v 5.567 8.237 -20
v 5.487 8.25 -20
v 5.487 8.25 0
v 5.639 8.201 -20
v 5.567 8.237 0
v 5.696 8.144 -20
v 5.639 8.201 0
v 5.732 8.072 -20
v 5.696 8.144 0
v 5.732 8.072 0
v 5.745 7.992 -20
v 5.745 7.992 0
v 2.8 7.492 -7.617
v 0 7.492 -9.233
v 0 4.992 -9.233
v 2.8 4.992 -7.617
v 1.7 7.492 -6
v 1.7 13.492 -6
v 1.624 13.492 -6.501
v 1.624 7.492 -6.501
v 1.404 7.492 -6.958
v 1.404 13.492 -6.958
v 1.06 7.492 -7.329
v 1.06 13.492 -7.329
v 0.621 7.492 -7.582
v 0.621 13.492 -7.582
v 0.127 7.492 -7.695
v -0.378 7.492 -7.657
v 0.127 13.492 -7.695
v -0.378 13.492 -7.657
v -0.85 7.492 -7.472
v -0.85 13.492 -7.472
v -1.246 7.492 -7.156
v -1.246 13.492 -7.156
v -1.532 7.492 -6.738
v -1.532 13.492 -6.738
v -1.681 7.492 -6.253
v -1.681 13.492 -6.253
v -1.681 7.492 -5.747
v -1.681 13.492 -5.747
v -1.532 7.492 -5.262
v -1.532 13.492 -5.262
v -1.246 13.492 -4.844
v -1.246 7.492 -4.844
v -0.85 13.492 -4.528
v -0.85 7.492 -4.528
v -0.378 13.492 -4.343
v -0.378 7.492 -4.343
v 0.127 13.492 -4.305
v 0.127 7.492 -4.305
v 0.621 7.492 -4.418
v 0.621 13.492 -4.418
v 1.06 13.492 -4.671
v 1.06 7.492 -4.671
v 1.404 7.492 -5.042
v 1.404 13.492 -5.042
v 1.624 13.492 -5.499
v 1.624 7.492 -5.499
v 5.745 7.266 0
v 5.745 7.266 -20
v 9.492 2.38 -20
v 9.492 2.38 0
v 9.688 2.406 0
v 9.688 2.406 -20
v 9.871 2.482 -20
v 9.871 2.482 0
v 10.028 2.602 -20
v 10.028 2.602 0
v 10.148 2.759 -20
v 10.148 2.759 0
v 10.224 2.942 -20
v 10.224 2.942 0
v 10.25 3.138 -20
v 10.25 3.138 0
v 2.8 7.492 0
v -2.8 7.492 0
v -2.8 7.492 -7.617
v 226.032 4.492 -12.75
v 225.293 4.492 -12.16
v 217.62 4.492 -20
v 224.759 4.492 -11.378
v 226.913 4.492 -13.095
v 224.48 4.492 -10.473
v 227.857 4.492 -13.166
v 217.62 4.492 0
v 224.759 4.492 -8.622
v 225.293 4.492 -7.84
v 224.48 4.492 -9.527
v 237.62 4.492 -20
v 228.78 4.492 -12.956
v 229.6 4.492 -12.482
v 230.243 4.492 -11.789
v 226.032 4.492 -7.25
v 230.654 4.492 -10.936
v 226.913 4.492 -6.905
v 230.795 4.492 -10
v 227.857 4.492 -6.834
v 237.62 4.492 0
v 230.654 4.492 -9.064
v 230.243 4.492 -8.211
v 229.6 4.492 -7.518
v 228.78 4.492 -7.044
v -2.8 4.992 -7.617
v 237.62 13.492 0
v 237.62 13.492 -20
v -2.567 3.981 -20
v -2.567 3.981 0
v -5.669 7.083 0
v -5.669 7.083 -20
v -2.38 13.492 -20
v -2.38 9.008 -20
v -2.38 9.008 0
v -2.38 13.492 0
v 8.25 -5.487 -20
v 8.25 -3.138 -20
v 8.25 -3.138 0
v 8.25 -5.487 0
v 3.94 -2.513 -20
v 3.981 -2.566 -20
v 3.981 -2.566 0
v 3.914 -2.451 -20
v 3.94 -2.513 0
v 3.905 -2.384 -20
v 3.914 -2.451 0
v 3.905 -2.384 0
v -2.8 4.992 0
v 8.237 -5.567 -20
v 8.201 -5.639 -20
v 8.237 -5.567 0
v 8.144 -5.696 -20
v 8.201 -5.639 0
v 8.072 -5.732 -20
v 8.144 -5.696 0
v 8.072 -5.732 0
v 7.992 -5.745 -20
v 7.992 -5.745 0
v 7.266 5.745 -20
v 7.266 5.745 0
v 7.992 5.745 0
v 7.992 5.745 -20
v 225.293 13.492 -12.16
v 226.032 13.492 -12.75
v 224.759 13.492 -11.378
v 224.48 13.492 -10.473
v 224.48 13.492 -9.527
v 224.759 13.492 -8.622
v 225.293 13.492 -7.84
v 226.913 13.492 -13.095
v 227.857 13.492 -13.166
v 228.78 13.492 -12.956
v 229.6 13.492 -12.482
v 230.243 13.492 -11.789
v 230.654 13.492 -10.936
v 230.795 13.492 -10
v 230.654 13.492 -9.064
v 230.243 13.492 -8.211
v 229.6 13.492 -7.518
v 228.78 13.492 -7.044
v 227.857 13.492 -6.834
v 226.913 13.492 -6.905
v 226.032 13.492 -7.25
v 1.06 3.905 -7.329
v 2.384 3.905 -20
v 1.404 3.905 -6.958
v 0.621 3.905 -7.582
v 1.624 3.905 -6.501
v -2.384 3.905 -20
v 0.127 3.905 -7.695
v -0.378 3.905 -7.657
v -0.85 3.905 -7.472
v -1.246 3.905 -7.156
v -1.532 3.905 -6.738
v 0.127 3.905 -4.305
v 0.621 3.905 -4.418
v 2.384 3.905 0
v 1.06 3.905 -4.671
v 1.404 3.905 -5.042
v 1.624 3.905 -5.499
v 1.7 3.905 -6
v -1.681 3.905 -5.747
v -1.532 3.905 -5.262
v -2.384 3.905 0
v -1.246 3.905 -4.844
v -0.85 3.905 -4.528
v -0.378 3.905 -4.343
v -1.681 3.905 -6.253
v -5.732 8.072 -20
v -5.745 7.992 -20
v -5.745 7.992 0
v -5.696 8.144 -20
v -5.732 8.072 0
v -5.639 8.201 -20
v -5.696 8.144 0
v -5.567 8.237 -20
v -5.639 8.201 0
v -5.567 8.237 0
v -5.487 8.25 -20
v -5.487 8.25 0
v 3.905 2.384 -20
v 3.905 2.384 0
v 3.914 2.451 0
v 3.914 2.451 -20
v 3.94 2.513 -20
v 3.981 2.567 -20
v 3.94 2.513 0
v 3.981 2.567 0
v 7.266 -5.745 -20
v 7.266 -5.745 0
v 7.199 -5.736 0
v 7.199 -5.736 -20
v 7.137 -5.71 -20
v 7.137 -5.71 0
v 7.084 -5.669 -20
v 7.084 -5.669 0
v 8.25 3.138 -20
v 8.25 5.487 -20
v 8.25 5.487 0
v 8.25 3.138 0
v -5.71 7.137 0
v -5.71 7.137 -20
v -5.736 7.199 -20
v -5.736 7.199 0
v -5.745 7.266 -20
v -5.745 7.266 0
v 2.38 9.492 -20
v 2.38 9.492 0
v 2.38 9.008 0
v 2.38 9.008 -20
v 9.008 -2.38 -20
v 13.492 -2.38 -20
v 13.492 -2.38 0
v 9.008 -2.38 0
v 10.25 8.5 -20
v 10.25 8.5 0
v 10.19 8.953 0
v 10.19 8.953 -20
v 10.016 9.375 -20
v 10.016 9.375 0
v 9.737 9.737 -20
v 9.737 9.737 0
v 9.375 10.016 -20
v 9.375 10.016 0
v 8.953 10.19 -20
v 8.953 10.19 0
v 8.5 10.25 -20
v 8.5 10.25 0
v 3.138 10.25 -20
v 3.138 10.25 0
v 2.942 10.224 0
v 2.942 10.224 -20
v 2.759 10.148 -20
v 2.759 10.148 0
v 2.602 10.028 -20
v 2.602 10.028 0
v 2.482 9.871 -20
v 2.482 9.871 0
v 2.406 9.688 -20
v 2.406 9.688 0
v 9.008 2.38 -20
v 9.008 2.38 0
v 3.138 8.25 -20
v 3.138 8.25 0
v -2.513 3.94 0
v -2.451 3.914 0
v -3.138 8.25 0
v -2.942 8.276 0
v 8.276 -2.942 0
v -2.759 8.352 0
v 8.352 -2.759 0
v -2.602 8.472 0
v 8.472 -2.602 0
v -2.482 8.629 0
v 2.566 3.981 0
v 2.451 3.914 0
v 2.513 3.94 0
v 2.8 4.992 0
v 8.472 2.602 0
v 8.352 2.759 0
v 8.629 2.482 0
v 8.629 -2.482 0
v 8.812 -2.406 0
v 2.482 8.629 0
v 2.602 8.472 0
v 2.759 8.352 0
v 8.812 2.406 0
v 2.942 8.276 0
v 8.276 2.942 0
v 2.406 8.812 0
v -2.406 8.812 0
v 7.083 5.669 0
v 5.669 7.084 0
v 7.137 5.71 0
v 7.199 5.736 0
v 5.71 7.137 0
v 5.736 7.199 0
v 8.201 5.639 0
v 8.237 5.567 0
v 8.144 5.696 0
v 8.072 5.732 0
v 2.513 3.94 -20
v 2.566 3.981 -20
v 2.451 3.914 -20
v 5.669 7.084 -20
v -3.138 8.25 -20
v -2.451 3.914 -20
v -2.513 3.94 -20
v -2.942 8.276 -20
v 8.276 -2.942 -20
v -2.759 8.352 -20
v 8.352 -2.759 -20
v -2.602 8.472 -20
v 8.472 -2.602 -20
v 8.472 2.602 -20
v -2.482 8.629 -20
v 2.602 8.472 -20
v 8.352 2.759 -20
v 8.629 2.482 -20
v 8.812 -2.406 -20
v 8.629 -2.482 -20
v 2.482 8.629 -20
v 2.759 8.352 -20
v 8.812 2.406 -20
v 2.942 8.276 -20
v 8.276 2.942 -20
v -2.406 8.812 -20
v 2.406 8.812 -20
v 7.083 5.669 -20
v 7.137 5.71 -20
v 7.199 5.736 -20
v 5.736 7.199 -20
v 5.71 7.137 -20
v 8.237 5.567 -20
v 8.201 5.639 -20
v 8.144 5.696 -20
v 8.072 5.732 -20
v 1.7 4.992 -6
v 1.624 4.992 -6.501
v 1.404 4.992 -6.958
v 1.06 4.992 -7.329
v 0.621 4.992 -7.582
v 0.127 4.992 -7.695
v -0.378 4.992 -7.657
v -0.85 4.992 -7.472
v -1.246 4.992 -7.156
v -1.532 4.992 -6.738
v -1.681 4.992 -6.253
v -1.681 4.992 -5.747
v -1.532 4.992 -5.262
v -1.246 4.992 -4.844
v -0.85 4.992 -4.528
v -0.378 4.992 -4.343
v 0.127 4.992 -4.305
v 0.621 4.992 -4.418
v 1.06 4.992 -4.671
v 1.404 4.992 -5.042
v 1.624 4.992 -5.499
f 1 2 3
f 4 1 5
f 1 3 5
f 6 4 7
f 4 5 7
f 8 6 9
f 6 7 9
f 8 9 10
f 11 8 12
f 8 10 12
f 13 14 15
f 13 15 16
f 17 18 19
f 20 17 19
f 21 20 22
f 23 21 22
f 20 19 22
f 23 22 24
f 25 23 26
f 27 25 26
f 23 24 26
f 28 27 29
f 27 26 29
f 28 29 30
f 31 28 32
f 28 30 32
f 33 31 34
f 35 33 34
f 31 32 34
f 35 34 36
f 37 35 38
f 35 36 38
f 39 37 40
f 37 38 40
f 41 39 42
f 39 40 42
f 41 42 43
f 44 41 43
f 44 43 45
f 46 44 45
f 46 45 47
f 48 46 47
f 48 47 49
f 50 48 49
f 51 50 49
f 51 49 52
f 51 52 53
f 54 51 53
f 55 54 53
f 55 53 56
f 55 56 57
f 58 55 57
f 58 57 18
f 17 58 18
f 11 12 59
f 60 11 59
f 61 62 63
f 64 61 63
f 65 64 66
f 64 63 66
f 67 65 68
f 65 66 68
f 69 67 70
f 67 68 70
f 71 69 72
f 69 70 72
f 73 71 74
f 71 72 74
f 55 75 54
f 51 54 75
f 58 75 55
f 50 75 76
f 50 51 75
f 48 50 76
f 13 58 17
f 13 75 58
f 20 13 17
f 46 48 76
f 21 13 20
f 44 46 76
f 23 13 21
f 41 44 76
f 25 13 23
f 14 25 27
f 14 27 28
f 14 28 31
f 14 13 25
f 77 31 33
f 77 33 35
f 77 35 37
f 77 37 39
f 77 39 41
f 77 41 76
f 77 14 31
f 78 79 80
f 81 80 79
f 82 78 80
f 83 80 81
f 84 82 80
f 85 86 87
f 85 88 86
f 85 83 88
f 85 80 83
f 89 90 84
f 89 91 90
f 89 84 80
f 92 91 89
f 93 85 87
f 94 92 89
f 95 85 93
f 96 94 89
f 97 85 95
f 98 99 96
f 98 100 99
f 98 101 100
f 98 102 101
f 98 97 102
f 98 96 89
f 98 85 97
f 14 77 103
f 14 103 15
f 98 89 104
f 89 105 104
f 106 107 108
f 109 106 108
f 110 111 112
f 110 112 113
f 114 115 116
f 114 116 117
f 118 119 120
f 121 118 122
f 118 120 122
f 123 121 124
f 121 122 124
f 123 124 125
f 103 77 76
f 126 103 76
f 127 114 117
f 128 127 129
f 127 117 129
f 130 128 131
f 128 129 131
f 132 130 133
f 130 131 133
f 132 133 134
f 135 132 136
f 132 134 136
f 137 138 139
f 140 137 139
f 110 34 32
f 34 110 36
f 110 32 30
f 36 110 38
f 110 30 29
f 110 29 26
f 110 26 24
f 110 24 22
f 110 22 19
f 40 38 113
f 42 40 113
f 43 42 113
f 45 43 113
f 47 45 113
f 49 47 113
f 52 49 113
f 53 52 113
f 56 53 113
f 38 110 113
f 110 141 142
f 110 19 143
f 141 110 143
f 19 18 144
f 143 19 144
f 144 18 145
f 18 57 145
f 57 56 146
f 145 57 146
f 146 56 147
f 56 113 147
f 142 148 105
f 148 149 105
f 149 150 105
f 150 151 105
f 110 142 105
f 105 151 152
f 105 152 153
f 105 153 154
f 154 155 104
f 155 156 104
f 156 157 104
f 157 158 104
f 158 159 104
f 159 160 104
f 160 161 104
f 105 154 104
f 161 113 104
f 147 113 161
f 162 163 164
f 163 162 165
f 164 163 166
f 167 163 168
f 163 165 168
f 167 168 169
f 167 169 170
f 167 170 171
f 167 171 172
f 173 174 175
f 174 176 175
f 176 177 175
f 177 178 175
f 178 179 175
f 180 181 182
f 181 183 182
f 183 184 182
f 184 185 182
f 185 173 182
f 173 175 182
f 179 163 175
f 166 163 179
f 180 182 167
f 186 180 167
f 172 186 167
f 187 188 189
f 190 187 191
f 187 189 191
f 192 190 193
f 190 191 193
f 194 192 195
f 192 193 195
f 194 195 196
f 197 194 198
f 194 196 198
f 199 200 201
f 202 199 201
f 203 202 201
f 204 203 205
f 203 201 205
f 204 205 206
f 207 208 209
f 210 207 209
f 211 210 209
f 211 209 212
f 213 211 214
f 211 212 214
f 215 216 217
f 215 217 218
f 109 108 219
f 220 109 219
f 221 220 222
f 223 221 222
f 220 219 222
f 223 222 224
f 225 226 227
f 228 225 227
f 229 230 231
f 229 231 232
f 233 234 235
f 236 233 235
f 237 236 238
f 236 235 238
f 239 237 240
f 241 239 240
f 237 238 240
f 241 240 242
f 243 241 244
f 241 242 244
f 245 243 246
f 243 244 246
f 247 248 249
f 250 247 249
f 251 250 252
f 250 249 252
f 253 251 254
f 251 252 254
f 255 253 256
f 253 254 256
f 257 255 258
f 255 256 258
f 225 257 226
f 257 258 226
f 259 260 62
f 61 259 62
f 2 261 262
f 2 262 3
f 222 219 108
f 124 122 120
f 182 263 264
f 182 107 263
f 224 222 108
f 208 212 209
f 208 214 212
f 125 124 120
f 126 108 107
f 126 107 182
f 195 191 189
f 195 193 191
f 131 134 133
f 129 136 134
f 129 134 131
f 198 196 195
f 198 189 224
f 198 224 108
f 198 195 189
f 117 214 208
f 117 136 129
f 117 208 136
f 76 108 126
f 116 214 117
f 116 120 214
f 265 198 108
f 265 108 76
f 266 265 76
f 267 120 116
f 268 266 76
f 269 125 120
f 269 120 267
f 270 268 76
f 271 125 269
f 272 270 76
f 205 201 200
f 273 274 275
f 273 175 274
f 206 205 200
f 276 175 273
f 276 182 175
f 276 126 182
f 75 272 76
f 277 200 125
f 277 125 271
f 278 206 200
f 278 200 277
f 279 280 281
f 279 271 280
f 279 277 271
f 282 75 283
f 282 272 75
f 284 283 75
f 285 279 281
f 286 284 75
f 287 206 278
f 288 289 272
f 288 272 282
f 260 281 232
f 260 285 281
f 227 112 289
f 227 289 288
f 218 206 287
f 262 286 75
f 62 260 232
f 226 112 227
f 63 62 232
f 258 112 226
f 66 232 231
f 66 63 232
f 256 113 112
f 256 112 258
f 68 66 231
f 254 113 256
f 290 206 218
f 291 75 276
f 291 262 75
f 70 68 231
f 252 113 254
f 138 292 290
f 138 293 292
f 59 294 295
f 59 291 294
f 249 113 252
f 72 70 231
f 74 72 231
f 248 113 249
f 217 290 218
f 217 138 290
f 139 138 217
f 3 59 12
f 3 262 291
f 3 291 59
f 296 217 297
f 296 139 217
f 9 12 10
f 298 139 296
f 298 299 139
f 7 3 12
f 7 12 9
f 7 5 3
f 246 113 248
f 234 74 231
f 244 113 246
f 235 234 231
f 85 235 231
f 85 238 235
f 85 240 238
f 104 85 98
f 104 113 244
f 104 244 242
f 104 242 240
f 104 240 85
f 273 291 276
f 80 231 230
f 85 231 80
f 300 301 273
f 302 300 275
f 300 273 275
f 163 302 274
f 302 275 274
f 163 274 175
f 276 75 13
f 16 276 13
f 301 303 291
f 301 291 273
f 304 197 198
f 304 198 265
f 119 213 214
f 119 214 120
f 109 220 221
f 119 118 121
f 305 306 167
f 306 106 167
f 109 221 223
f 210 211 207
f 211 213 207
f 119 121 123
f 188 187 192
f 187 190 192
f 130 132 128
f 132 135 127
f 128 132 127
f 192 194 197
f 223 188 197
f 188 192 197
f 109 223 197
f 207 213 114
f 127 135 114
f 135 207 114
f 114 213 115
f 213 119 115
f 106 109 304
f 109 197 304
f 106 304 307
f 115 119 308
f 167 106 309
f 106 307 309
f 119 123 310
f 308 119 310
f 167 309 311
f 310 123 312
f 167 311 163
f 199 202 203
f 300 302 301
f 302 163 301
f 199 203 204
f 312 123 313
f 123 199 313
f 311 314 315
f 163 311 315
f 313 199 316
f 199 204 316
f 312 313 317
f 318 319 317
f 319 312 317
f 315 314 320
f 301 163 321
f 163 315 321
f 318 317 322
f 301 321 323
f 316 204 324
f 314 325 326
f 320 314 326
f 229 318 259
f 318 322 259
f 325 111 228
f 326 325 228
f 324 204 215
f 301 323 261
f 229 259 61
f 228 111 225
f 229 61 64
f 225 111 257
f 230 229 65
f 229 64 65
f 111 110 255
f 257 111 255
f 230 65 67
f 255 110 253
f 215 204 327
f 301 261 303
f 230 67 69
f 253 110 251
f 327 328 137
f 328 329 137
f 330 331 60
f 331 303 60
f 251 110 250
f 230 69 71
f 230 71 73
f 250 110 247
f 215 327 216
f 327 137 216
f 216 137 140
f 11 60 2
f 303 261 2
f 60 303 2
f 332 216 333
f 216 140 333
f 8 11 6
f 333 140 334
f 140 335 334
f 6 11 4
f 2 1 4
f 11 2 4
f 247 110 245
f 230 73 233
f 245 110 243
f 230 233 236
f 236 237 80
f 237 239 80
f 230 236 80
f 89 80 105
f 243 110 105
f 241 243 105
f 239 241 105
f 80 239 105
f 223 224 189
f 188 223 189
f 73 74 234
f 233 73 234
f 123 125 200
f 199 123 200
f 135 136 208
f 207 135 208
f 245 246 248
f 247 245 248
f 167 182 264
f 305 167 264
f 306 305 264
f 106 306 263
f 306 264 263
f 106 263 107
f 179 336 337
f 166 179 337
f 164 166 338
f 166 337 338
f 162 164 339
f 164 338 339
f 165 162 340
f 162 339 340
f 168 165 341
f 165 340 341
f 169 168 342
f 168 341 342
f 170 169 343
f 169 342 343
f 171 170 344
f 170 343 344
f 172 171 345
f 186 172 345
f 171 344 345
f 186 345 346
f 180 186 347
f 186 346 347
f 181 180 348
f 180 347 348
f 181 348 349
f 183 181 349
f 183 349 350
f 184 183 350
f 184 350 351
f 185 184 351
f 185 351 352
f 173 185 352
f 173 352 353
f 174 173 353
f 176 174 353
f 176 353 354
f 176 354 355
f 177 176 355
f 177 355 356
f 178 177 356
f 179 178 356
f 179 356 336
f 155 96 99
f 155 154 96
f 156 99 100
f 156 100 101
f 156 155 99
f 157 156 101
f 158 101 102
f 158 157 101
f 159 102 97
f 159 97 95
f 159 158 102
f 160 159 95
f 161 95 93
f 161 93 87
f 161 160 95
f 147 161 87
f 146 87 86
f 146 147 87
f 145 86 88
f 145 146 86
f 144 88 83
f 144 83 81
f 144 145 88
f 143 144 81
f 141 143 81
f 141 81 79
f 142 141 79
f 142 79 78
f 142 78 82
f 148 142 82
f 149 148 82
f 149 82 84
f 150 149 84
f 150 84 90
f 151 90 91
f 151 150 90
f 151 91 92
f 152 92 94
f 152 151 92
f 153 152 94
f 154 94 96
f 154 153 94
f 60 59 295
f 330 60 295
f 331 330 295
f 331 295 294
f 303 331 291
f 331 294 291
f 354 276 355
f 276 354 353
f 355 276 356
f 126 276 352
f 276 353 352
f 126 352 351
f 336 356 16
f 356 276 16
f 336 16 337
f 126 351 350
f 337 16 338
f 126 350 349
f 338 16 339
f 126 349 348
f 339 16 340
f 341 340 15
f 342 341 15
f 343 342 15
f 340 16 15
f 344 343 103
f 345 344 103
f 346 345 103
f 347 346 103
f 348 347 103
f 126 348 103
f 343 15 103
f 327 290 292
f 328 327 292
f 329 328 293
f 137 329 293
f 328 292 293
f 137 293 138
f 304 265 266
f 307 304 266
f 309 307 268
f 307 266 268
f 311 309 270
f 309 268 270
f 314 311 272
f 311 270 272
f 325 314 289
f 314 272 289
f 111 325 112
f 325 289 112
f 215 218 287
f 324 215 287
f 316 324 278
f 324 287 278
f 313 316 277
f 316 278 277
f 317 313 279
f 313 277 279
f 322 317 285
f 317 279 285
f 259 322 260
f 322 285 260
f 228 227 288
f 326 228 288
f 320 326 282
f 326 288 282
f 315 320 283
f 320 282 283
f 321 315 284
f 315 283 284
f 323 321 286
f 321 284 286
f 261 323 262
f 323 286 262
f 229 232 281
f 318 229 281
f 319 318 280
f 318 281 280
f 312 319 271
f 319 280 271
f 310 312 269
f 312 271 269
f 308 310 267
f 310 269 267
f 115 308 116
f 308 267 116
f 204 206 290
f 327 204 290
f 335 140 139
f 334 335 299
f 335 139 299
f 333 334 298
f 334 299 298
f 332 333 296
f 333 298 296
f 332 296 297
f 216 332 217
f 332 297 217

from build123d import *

# Parameters (mm, degrees)
BOSS_EXTRUDE1_DEPTH = 20
BOSS_EXTRUDE2_DEPTH = 20
CUT_EXTRUDE1_DEPTH  = 20
SKETCH4_R           = 3.175
CUT_EXTRUDE2_DEPTH  = 4
SKETCH5_W           = 20
SKETCH5_H           = 20
SKETCH5_R           = 3.175
BOSS_EXTRUDE3_DEPTH = 5
BOSS_EXTRUDE4_DEPTH = 20
CUT_EXTRUDE3_START  = -6
CUT_EXTRUDE3_DEPTH  = 2.5
SKETCH9_R           = 1.7
CUT_EXTRUDE4_DEPTH  = 20.237


with BuildPart() as part:
    # Sketch1 → Boss-Extrude1 (new body)
    with BuildSketch(Plane.XY):
        with BuildLine():
            ThreePointArc((-3.138, 8.25), (-2.60201306, 8.47201306), (-2.38, 9.008))
            Line((-2.38, 9.008), (-2.38, 9.492))
            Line((-2.38, 9.492), (-2.38, 13.492))
            Line((-2.38, 13.492), (13.492, 13.492))
            Line((13.492, 13.492), (13.492, -2.38))
            Line((13.492, -2.38), (9.492, -2.38))
            Line((9.492, -2.38), (9.008, -2.38))
            ThreePointArc((9.008, -2.38), (8.47201306, -2.60201306), (8.25, -3.138))
            Line((8.25, -3.138), (8.25, -5.487))
            ThreePointArc((8.25, -5.487), (8.17443355, -5.66943355), (7.992, -5.745))
            Line((7.992, -5.745), (7.266240833, -5.745))
            ThreePointArc((7.266240833, -5.745), (7.167508508, -5.725360919), (7.083807284, -5.66943355))
            Line((7.083807284, -5.66943355), (3.98056645, -2.566192716))
            ThreePointArc((3.98056645, -2.566192716), (3.924639081, -2.482491492), (3.905, -2.383759167))
            Line((3.905, -2.383759167), (3.905, 2.38407951))
            ThreePointArc((3.905, 2.38407951), (3.924639081, 2.482811836), (3.98056645, 2.56651306))
            Line((3.98056645, 2.56651306), (7.08348694, 5.66943355))
            ThreePointArc((7.08348694, 5.66943355), (7.167188164, 5.725360919), (7.26592049, 5.745))
            Line((7.26592049, 5.745), (7.992, 5.745))
            ThreePointArc((7.992, 5.745), (8.17443355, 5.66943355), (8.25, 5.487))
            Line((8.25, 5.487), (8.25, 3.138))
            ThreePointArc((8.25, 3.138), (8.47201306, 2.60201306), (9.008, 2.38))
            Line((9.008, 2.38), (9.492, 2.38))
            ThreePointArc((9.492, 2.38), (10.02798694, 2.60201306), (10.25, 3.138))
            Line((10.25, 3.138), (10.25, 8.5))
            ThreePointArc((10.25, 8.5), (9.737436867, 9.737436867), (8.5, 10.25))
            Line((8.5, 10.25), (3.138, 10.25))
            ThreePointArc((3.138, 10.25), (2.60201306, 10.02798694), (2.38, 9.492))
            Line((2.38, 9.492), (2.38, 9.008))
            ThreePointArc((2.38, 9.008), (2.60201306, 8.47201306), (3.138, 8.25))
            Line((3.138, 8.25), (5.487, 8.25))
            ThreePointArc((5.487, 8.25), (5.66943355, 8.17443355), (5.745, 7.992))
            Line((5.745, 7.992), (5.745, 7.266240833))
            ThreePointArc((5.745, 7.266240833), (5.725360919, 7.167508508), (5.66943355, 7.083807284))
            Line((5.66943355, 7.083807284), (2.566192716, 3.98056645))
            ThreePointArc((2.566192716, 3.98056645), (2.482491492, 3.924639081), (2.383759167, 3.905))
            Line((2.383759167, 3.905), (-2.38407951, 3.905))
            ThreePointArc((-2.38407951, 3.905), (-2.482811836, 3.924639081), (-2.56651306, 3.98056645))
            Line((-2.56651306, 3.98056645), (-5.66943355, 7.08348694))
            ThreePointArc((-5.66943355, 7.08348694), (-5.725360919, 7.167188164), (-5.745, 7.26592049))
            Line((-5.745, 7.26592049), (-5.745, 7.992))
            ThreePointArc((-5.745, 7.992), (-5.66943355, 8.17443355), (-5.487, 8.25))
            Line((-5.487, 8.25), (-3.138, 8.25))
        make_face()
    extrude(amount=-BOSS_EXTRUDE1_DEPTH)

    # Sketch2 → Boss-Extrude2 (add)
    with BuildSketch(Plane.XY):
        Polygon((13.492, 13.492), (237.62, 13.492), (237.62, 9.492), (13.492, -2.38), align=None)
    extrude(amount=-BOSS_EXTRUDE2_DEPTH)

    # Sketch3 → Cut-Extrude1 (cut)
    with BuildSketch(Plane.XY):
        Polygon((237.62, 9.492), (217.62, 9.492), (217.62, 8.432605368), align=None)
    extrude(amount=-CUT_EXTRUDE1_DEPTH, mode=Mode.SUBTRACT)

    # Sketch4 → Cut-Extrude2 (cut)
    with BuildSketch(Plane.XZ.offset(-9.492)):
        with Locations((227.62, -10)):
            Circle(SKETCH4_R)
    extrude(amount=-CUT_EXTRUDE2_DEPTH, mode=Mode.SUBTRACT)

    # Sketch5 → Boss-Extrude3 (add)
    with BuildSketch(Plane.XZ.offset(-9.492)):
        with Locations((227.62, -10)):
            Rectangle(SKETCH5_W, SKETCH5_H)
        with Locations((227.62, -10)):
            Circle(SKETCH5_R, mode=Mode.SUBTRACT)
    extrude(amount=BOSS_EXTRUDE3_DEPTH)

    # Sketch6 → Boss-Extrude4 (add)
    with BuildSketch(Plane.XY):
        Polygon((13.492, -2.38), (217.62, 4.492), (217.62, 8.432605368), align=None)
    extrude(amount=-BOSS_EXTRUDE4_DEPTH)

    # Sketch8 → Cut-Extrude3 (cut)
    with BuildSketch(Plane(origin=(0, 13.492, 0), x_dir=(1, 0, 0), z_dir=(0, 1, 0)).offset(CUT_EXTRUDE3_START)):
        Polygon((2.383759167, 0), (-2.38407951, 0), (-2.800160172, 0), (-2.800160172, 4.383419246), (-2.800160172, 7.616580754), (-0.000160172, 9.233161507), (2.799839828, 7.616580754), (2.799839828, 4.383419246), (2.799839828, 0), align=None)
    extrude(amount=-CUT_EXTRUDE3_DEPTH, mode=Mode.SUBTRACT)

    # Sketch9 → Cut-Extrude4 (cut, through all)
    with BuildSketch(Plane(origin=(0, 13.492, 0), x_dir=(1, 0, 0), z_dir=(0, 1, 0))):
        with Locations((-0.000160172, 6)):
            Circle(SKETCH9_R)
    extrude(amount=-CUT_EXTRUDE4_DEPTH, mode=Mode.SUBTRACT)


solid = part.part
